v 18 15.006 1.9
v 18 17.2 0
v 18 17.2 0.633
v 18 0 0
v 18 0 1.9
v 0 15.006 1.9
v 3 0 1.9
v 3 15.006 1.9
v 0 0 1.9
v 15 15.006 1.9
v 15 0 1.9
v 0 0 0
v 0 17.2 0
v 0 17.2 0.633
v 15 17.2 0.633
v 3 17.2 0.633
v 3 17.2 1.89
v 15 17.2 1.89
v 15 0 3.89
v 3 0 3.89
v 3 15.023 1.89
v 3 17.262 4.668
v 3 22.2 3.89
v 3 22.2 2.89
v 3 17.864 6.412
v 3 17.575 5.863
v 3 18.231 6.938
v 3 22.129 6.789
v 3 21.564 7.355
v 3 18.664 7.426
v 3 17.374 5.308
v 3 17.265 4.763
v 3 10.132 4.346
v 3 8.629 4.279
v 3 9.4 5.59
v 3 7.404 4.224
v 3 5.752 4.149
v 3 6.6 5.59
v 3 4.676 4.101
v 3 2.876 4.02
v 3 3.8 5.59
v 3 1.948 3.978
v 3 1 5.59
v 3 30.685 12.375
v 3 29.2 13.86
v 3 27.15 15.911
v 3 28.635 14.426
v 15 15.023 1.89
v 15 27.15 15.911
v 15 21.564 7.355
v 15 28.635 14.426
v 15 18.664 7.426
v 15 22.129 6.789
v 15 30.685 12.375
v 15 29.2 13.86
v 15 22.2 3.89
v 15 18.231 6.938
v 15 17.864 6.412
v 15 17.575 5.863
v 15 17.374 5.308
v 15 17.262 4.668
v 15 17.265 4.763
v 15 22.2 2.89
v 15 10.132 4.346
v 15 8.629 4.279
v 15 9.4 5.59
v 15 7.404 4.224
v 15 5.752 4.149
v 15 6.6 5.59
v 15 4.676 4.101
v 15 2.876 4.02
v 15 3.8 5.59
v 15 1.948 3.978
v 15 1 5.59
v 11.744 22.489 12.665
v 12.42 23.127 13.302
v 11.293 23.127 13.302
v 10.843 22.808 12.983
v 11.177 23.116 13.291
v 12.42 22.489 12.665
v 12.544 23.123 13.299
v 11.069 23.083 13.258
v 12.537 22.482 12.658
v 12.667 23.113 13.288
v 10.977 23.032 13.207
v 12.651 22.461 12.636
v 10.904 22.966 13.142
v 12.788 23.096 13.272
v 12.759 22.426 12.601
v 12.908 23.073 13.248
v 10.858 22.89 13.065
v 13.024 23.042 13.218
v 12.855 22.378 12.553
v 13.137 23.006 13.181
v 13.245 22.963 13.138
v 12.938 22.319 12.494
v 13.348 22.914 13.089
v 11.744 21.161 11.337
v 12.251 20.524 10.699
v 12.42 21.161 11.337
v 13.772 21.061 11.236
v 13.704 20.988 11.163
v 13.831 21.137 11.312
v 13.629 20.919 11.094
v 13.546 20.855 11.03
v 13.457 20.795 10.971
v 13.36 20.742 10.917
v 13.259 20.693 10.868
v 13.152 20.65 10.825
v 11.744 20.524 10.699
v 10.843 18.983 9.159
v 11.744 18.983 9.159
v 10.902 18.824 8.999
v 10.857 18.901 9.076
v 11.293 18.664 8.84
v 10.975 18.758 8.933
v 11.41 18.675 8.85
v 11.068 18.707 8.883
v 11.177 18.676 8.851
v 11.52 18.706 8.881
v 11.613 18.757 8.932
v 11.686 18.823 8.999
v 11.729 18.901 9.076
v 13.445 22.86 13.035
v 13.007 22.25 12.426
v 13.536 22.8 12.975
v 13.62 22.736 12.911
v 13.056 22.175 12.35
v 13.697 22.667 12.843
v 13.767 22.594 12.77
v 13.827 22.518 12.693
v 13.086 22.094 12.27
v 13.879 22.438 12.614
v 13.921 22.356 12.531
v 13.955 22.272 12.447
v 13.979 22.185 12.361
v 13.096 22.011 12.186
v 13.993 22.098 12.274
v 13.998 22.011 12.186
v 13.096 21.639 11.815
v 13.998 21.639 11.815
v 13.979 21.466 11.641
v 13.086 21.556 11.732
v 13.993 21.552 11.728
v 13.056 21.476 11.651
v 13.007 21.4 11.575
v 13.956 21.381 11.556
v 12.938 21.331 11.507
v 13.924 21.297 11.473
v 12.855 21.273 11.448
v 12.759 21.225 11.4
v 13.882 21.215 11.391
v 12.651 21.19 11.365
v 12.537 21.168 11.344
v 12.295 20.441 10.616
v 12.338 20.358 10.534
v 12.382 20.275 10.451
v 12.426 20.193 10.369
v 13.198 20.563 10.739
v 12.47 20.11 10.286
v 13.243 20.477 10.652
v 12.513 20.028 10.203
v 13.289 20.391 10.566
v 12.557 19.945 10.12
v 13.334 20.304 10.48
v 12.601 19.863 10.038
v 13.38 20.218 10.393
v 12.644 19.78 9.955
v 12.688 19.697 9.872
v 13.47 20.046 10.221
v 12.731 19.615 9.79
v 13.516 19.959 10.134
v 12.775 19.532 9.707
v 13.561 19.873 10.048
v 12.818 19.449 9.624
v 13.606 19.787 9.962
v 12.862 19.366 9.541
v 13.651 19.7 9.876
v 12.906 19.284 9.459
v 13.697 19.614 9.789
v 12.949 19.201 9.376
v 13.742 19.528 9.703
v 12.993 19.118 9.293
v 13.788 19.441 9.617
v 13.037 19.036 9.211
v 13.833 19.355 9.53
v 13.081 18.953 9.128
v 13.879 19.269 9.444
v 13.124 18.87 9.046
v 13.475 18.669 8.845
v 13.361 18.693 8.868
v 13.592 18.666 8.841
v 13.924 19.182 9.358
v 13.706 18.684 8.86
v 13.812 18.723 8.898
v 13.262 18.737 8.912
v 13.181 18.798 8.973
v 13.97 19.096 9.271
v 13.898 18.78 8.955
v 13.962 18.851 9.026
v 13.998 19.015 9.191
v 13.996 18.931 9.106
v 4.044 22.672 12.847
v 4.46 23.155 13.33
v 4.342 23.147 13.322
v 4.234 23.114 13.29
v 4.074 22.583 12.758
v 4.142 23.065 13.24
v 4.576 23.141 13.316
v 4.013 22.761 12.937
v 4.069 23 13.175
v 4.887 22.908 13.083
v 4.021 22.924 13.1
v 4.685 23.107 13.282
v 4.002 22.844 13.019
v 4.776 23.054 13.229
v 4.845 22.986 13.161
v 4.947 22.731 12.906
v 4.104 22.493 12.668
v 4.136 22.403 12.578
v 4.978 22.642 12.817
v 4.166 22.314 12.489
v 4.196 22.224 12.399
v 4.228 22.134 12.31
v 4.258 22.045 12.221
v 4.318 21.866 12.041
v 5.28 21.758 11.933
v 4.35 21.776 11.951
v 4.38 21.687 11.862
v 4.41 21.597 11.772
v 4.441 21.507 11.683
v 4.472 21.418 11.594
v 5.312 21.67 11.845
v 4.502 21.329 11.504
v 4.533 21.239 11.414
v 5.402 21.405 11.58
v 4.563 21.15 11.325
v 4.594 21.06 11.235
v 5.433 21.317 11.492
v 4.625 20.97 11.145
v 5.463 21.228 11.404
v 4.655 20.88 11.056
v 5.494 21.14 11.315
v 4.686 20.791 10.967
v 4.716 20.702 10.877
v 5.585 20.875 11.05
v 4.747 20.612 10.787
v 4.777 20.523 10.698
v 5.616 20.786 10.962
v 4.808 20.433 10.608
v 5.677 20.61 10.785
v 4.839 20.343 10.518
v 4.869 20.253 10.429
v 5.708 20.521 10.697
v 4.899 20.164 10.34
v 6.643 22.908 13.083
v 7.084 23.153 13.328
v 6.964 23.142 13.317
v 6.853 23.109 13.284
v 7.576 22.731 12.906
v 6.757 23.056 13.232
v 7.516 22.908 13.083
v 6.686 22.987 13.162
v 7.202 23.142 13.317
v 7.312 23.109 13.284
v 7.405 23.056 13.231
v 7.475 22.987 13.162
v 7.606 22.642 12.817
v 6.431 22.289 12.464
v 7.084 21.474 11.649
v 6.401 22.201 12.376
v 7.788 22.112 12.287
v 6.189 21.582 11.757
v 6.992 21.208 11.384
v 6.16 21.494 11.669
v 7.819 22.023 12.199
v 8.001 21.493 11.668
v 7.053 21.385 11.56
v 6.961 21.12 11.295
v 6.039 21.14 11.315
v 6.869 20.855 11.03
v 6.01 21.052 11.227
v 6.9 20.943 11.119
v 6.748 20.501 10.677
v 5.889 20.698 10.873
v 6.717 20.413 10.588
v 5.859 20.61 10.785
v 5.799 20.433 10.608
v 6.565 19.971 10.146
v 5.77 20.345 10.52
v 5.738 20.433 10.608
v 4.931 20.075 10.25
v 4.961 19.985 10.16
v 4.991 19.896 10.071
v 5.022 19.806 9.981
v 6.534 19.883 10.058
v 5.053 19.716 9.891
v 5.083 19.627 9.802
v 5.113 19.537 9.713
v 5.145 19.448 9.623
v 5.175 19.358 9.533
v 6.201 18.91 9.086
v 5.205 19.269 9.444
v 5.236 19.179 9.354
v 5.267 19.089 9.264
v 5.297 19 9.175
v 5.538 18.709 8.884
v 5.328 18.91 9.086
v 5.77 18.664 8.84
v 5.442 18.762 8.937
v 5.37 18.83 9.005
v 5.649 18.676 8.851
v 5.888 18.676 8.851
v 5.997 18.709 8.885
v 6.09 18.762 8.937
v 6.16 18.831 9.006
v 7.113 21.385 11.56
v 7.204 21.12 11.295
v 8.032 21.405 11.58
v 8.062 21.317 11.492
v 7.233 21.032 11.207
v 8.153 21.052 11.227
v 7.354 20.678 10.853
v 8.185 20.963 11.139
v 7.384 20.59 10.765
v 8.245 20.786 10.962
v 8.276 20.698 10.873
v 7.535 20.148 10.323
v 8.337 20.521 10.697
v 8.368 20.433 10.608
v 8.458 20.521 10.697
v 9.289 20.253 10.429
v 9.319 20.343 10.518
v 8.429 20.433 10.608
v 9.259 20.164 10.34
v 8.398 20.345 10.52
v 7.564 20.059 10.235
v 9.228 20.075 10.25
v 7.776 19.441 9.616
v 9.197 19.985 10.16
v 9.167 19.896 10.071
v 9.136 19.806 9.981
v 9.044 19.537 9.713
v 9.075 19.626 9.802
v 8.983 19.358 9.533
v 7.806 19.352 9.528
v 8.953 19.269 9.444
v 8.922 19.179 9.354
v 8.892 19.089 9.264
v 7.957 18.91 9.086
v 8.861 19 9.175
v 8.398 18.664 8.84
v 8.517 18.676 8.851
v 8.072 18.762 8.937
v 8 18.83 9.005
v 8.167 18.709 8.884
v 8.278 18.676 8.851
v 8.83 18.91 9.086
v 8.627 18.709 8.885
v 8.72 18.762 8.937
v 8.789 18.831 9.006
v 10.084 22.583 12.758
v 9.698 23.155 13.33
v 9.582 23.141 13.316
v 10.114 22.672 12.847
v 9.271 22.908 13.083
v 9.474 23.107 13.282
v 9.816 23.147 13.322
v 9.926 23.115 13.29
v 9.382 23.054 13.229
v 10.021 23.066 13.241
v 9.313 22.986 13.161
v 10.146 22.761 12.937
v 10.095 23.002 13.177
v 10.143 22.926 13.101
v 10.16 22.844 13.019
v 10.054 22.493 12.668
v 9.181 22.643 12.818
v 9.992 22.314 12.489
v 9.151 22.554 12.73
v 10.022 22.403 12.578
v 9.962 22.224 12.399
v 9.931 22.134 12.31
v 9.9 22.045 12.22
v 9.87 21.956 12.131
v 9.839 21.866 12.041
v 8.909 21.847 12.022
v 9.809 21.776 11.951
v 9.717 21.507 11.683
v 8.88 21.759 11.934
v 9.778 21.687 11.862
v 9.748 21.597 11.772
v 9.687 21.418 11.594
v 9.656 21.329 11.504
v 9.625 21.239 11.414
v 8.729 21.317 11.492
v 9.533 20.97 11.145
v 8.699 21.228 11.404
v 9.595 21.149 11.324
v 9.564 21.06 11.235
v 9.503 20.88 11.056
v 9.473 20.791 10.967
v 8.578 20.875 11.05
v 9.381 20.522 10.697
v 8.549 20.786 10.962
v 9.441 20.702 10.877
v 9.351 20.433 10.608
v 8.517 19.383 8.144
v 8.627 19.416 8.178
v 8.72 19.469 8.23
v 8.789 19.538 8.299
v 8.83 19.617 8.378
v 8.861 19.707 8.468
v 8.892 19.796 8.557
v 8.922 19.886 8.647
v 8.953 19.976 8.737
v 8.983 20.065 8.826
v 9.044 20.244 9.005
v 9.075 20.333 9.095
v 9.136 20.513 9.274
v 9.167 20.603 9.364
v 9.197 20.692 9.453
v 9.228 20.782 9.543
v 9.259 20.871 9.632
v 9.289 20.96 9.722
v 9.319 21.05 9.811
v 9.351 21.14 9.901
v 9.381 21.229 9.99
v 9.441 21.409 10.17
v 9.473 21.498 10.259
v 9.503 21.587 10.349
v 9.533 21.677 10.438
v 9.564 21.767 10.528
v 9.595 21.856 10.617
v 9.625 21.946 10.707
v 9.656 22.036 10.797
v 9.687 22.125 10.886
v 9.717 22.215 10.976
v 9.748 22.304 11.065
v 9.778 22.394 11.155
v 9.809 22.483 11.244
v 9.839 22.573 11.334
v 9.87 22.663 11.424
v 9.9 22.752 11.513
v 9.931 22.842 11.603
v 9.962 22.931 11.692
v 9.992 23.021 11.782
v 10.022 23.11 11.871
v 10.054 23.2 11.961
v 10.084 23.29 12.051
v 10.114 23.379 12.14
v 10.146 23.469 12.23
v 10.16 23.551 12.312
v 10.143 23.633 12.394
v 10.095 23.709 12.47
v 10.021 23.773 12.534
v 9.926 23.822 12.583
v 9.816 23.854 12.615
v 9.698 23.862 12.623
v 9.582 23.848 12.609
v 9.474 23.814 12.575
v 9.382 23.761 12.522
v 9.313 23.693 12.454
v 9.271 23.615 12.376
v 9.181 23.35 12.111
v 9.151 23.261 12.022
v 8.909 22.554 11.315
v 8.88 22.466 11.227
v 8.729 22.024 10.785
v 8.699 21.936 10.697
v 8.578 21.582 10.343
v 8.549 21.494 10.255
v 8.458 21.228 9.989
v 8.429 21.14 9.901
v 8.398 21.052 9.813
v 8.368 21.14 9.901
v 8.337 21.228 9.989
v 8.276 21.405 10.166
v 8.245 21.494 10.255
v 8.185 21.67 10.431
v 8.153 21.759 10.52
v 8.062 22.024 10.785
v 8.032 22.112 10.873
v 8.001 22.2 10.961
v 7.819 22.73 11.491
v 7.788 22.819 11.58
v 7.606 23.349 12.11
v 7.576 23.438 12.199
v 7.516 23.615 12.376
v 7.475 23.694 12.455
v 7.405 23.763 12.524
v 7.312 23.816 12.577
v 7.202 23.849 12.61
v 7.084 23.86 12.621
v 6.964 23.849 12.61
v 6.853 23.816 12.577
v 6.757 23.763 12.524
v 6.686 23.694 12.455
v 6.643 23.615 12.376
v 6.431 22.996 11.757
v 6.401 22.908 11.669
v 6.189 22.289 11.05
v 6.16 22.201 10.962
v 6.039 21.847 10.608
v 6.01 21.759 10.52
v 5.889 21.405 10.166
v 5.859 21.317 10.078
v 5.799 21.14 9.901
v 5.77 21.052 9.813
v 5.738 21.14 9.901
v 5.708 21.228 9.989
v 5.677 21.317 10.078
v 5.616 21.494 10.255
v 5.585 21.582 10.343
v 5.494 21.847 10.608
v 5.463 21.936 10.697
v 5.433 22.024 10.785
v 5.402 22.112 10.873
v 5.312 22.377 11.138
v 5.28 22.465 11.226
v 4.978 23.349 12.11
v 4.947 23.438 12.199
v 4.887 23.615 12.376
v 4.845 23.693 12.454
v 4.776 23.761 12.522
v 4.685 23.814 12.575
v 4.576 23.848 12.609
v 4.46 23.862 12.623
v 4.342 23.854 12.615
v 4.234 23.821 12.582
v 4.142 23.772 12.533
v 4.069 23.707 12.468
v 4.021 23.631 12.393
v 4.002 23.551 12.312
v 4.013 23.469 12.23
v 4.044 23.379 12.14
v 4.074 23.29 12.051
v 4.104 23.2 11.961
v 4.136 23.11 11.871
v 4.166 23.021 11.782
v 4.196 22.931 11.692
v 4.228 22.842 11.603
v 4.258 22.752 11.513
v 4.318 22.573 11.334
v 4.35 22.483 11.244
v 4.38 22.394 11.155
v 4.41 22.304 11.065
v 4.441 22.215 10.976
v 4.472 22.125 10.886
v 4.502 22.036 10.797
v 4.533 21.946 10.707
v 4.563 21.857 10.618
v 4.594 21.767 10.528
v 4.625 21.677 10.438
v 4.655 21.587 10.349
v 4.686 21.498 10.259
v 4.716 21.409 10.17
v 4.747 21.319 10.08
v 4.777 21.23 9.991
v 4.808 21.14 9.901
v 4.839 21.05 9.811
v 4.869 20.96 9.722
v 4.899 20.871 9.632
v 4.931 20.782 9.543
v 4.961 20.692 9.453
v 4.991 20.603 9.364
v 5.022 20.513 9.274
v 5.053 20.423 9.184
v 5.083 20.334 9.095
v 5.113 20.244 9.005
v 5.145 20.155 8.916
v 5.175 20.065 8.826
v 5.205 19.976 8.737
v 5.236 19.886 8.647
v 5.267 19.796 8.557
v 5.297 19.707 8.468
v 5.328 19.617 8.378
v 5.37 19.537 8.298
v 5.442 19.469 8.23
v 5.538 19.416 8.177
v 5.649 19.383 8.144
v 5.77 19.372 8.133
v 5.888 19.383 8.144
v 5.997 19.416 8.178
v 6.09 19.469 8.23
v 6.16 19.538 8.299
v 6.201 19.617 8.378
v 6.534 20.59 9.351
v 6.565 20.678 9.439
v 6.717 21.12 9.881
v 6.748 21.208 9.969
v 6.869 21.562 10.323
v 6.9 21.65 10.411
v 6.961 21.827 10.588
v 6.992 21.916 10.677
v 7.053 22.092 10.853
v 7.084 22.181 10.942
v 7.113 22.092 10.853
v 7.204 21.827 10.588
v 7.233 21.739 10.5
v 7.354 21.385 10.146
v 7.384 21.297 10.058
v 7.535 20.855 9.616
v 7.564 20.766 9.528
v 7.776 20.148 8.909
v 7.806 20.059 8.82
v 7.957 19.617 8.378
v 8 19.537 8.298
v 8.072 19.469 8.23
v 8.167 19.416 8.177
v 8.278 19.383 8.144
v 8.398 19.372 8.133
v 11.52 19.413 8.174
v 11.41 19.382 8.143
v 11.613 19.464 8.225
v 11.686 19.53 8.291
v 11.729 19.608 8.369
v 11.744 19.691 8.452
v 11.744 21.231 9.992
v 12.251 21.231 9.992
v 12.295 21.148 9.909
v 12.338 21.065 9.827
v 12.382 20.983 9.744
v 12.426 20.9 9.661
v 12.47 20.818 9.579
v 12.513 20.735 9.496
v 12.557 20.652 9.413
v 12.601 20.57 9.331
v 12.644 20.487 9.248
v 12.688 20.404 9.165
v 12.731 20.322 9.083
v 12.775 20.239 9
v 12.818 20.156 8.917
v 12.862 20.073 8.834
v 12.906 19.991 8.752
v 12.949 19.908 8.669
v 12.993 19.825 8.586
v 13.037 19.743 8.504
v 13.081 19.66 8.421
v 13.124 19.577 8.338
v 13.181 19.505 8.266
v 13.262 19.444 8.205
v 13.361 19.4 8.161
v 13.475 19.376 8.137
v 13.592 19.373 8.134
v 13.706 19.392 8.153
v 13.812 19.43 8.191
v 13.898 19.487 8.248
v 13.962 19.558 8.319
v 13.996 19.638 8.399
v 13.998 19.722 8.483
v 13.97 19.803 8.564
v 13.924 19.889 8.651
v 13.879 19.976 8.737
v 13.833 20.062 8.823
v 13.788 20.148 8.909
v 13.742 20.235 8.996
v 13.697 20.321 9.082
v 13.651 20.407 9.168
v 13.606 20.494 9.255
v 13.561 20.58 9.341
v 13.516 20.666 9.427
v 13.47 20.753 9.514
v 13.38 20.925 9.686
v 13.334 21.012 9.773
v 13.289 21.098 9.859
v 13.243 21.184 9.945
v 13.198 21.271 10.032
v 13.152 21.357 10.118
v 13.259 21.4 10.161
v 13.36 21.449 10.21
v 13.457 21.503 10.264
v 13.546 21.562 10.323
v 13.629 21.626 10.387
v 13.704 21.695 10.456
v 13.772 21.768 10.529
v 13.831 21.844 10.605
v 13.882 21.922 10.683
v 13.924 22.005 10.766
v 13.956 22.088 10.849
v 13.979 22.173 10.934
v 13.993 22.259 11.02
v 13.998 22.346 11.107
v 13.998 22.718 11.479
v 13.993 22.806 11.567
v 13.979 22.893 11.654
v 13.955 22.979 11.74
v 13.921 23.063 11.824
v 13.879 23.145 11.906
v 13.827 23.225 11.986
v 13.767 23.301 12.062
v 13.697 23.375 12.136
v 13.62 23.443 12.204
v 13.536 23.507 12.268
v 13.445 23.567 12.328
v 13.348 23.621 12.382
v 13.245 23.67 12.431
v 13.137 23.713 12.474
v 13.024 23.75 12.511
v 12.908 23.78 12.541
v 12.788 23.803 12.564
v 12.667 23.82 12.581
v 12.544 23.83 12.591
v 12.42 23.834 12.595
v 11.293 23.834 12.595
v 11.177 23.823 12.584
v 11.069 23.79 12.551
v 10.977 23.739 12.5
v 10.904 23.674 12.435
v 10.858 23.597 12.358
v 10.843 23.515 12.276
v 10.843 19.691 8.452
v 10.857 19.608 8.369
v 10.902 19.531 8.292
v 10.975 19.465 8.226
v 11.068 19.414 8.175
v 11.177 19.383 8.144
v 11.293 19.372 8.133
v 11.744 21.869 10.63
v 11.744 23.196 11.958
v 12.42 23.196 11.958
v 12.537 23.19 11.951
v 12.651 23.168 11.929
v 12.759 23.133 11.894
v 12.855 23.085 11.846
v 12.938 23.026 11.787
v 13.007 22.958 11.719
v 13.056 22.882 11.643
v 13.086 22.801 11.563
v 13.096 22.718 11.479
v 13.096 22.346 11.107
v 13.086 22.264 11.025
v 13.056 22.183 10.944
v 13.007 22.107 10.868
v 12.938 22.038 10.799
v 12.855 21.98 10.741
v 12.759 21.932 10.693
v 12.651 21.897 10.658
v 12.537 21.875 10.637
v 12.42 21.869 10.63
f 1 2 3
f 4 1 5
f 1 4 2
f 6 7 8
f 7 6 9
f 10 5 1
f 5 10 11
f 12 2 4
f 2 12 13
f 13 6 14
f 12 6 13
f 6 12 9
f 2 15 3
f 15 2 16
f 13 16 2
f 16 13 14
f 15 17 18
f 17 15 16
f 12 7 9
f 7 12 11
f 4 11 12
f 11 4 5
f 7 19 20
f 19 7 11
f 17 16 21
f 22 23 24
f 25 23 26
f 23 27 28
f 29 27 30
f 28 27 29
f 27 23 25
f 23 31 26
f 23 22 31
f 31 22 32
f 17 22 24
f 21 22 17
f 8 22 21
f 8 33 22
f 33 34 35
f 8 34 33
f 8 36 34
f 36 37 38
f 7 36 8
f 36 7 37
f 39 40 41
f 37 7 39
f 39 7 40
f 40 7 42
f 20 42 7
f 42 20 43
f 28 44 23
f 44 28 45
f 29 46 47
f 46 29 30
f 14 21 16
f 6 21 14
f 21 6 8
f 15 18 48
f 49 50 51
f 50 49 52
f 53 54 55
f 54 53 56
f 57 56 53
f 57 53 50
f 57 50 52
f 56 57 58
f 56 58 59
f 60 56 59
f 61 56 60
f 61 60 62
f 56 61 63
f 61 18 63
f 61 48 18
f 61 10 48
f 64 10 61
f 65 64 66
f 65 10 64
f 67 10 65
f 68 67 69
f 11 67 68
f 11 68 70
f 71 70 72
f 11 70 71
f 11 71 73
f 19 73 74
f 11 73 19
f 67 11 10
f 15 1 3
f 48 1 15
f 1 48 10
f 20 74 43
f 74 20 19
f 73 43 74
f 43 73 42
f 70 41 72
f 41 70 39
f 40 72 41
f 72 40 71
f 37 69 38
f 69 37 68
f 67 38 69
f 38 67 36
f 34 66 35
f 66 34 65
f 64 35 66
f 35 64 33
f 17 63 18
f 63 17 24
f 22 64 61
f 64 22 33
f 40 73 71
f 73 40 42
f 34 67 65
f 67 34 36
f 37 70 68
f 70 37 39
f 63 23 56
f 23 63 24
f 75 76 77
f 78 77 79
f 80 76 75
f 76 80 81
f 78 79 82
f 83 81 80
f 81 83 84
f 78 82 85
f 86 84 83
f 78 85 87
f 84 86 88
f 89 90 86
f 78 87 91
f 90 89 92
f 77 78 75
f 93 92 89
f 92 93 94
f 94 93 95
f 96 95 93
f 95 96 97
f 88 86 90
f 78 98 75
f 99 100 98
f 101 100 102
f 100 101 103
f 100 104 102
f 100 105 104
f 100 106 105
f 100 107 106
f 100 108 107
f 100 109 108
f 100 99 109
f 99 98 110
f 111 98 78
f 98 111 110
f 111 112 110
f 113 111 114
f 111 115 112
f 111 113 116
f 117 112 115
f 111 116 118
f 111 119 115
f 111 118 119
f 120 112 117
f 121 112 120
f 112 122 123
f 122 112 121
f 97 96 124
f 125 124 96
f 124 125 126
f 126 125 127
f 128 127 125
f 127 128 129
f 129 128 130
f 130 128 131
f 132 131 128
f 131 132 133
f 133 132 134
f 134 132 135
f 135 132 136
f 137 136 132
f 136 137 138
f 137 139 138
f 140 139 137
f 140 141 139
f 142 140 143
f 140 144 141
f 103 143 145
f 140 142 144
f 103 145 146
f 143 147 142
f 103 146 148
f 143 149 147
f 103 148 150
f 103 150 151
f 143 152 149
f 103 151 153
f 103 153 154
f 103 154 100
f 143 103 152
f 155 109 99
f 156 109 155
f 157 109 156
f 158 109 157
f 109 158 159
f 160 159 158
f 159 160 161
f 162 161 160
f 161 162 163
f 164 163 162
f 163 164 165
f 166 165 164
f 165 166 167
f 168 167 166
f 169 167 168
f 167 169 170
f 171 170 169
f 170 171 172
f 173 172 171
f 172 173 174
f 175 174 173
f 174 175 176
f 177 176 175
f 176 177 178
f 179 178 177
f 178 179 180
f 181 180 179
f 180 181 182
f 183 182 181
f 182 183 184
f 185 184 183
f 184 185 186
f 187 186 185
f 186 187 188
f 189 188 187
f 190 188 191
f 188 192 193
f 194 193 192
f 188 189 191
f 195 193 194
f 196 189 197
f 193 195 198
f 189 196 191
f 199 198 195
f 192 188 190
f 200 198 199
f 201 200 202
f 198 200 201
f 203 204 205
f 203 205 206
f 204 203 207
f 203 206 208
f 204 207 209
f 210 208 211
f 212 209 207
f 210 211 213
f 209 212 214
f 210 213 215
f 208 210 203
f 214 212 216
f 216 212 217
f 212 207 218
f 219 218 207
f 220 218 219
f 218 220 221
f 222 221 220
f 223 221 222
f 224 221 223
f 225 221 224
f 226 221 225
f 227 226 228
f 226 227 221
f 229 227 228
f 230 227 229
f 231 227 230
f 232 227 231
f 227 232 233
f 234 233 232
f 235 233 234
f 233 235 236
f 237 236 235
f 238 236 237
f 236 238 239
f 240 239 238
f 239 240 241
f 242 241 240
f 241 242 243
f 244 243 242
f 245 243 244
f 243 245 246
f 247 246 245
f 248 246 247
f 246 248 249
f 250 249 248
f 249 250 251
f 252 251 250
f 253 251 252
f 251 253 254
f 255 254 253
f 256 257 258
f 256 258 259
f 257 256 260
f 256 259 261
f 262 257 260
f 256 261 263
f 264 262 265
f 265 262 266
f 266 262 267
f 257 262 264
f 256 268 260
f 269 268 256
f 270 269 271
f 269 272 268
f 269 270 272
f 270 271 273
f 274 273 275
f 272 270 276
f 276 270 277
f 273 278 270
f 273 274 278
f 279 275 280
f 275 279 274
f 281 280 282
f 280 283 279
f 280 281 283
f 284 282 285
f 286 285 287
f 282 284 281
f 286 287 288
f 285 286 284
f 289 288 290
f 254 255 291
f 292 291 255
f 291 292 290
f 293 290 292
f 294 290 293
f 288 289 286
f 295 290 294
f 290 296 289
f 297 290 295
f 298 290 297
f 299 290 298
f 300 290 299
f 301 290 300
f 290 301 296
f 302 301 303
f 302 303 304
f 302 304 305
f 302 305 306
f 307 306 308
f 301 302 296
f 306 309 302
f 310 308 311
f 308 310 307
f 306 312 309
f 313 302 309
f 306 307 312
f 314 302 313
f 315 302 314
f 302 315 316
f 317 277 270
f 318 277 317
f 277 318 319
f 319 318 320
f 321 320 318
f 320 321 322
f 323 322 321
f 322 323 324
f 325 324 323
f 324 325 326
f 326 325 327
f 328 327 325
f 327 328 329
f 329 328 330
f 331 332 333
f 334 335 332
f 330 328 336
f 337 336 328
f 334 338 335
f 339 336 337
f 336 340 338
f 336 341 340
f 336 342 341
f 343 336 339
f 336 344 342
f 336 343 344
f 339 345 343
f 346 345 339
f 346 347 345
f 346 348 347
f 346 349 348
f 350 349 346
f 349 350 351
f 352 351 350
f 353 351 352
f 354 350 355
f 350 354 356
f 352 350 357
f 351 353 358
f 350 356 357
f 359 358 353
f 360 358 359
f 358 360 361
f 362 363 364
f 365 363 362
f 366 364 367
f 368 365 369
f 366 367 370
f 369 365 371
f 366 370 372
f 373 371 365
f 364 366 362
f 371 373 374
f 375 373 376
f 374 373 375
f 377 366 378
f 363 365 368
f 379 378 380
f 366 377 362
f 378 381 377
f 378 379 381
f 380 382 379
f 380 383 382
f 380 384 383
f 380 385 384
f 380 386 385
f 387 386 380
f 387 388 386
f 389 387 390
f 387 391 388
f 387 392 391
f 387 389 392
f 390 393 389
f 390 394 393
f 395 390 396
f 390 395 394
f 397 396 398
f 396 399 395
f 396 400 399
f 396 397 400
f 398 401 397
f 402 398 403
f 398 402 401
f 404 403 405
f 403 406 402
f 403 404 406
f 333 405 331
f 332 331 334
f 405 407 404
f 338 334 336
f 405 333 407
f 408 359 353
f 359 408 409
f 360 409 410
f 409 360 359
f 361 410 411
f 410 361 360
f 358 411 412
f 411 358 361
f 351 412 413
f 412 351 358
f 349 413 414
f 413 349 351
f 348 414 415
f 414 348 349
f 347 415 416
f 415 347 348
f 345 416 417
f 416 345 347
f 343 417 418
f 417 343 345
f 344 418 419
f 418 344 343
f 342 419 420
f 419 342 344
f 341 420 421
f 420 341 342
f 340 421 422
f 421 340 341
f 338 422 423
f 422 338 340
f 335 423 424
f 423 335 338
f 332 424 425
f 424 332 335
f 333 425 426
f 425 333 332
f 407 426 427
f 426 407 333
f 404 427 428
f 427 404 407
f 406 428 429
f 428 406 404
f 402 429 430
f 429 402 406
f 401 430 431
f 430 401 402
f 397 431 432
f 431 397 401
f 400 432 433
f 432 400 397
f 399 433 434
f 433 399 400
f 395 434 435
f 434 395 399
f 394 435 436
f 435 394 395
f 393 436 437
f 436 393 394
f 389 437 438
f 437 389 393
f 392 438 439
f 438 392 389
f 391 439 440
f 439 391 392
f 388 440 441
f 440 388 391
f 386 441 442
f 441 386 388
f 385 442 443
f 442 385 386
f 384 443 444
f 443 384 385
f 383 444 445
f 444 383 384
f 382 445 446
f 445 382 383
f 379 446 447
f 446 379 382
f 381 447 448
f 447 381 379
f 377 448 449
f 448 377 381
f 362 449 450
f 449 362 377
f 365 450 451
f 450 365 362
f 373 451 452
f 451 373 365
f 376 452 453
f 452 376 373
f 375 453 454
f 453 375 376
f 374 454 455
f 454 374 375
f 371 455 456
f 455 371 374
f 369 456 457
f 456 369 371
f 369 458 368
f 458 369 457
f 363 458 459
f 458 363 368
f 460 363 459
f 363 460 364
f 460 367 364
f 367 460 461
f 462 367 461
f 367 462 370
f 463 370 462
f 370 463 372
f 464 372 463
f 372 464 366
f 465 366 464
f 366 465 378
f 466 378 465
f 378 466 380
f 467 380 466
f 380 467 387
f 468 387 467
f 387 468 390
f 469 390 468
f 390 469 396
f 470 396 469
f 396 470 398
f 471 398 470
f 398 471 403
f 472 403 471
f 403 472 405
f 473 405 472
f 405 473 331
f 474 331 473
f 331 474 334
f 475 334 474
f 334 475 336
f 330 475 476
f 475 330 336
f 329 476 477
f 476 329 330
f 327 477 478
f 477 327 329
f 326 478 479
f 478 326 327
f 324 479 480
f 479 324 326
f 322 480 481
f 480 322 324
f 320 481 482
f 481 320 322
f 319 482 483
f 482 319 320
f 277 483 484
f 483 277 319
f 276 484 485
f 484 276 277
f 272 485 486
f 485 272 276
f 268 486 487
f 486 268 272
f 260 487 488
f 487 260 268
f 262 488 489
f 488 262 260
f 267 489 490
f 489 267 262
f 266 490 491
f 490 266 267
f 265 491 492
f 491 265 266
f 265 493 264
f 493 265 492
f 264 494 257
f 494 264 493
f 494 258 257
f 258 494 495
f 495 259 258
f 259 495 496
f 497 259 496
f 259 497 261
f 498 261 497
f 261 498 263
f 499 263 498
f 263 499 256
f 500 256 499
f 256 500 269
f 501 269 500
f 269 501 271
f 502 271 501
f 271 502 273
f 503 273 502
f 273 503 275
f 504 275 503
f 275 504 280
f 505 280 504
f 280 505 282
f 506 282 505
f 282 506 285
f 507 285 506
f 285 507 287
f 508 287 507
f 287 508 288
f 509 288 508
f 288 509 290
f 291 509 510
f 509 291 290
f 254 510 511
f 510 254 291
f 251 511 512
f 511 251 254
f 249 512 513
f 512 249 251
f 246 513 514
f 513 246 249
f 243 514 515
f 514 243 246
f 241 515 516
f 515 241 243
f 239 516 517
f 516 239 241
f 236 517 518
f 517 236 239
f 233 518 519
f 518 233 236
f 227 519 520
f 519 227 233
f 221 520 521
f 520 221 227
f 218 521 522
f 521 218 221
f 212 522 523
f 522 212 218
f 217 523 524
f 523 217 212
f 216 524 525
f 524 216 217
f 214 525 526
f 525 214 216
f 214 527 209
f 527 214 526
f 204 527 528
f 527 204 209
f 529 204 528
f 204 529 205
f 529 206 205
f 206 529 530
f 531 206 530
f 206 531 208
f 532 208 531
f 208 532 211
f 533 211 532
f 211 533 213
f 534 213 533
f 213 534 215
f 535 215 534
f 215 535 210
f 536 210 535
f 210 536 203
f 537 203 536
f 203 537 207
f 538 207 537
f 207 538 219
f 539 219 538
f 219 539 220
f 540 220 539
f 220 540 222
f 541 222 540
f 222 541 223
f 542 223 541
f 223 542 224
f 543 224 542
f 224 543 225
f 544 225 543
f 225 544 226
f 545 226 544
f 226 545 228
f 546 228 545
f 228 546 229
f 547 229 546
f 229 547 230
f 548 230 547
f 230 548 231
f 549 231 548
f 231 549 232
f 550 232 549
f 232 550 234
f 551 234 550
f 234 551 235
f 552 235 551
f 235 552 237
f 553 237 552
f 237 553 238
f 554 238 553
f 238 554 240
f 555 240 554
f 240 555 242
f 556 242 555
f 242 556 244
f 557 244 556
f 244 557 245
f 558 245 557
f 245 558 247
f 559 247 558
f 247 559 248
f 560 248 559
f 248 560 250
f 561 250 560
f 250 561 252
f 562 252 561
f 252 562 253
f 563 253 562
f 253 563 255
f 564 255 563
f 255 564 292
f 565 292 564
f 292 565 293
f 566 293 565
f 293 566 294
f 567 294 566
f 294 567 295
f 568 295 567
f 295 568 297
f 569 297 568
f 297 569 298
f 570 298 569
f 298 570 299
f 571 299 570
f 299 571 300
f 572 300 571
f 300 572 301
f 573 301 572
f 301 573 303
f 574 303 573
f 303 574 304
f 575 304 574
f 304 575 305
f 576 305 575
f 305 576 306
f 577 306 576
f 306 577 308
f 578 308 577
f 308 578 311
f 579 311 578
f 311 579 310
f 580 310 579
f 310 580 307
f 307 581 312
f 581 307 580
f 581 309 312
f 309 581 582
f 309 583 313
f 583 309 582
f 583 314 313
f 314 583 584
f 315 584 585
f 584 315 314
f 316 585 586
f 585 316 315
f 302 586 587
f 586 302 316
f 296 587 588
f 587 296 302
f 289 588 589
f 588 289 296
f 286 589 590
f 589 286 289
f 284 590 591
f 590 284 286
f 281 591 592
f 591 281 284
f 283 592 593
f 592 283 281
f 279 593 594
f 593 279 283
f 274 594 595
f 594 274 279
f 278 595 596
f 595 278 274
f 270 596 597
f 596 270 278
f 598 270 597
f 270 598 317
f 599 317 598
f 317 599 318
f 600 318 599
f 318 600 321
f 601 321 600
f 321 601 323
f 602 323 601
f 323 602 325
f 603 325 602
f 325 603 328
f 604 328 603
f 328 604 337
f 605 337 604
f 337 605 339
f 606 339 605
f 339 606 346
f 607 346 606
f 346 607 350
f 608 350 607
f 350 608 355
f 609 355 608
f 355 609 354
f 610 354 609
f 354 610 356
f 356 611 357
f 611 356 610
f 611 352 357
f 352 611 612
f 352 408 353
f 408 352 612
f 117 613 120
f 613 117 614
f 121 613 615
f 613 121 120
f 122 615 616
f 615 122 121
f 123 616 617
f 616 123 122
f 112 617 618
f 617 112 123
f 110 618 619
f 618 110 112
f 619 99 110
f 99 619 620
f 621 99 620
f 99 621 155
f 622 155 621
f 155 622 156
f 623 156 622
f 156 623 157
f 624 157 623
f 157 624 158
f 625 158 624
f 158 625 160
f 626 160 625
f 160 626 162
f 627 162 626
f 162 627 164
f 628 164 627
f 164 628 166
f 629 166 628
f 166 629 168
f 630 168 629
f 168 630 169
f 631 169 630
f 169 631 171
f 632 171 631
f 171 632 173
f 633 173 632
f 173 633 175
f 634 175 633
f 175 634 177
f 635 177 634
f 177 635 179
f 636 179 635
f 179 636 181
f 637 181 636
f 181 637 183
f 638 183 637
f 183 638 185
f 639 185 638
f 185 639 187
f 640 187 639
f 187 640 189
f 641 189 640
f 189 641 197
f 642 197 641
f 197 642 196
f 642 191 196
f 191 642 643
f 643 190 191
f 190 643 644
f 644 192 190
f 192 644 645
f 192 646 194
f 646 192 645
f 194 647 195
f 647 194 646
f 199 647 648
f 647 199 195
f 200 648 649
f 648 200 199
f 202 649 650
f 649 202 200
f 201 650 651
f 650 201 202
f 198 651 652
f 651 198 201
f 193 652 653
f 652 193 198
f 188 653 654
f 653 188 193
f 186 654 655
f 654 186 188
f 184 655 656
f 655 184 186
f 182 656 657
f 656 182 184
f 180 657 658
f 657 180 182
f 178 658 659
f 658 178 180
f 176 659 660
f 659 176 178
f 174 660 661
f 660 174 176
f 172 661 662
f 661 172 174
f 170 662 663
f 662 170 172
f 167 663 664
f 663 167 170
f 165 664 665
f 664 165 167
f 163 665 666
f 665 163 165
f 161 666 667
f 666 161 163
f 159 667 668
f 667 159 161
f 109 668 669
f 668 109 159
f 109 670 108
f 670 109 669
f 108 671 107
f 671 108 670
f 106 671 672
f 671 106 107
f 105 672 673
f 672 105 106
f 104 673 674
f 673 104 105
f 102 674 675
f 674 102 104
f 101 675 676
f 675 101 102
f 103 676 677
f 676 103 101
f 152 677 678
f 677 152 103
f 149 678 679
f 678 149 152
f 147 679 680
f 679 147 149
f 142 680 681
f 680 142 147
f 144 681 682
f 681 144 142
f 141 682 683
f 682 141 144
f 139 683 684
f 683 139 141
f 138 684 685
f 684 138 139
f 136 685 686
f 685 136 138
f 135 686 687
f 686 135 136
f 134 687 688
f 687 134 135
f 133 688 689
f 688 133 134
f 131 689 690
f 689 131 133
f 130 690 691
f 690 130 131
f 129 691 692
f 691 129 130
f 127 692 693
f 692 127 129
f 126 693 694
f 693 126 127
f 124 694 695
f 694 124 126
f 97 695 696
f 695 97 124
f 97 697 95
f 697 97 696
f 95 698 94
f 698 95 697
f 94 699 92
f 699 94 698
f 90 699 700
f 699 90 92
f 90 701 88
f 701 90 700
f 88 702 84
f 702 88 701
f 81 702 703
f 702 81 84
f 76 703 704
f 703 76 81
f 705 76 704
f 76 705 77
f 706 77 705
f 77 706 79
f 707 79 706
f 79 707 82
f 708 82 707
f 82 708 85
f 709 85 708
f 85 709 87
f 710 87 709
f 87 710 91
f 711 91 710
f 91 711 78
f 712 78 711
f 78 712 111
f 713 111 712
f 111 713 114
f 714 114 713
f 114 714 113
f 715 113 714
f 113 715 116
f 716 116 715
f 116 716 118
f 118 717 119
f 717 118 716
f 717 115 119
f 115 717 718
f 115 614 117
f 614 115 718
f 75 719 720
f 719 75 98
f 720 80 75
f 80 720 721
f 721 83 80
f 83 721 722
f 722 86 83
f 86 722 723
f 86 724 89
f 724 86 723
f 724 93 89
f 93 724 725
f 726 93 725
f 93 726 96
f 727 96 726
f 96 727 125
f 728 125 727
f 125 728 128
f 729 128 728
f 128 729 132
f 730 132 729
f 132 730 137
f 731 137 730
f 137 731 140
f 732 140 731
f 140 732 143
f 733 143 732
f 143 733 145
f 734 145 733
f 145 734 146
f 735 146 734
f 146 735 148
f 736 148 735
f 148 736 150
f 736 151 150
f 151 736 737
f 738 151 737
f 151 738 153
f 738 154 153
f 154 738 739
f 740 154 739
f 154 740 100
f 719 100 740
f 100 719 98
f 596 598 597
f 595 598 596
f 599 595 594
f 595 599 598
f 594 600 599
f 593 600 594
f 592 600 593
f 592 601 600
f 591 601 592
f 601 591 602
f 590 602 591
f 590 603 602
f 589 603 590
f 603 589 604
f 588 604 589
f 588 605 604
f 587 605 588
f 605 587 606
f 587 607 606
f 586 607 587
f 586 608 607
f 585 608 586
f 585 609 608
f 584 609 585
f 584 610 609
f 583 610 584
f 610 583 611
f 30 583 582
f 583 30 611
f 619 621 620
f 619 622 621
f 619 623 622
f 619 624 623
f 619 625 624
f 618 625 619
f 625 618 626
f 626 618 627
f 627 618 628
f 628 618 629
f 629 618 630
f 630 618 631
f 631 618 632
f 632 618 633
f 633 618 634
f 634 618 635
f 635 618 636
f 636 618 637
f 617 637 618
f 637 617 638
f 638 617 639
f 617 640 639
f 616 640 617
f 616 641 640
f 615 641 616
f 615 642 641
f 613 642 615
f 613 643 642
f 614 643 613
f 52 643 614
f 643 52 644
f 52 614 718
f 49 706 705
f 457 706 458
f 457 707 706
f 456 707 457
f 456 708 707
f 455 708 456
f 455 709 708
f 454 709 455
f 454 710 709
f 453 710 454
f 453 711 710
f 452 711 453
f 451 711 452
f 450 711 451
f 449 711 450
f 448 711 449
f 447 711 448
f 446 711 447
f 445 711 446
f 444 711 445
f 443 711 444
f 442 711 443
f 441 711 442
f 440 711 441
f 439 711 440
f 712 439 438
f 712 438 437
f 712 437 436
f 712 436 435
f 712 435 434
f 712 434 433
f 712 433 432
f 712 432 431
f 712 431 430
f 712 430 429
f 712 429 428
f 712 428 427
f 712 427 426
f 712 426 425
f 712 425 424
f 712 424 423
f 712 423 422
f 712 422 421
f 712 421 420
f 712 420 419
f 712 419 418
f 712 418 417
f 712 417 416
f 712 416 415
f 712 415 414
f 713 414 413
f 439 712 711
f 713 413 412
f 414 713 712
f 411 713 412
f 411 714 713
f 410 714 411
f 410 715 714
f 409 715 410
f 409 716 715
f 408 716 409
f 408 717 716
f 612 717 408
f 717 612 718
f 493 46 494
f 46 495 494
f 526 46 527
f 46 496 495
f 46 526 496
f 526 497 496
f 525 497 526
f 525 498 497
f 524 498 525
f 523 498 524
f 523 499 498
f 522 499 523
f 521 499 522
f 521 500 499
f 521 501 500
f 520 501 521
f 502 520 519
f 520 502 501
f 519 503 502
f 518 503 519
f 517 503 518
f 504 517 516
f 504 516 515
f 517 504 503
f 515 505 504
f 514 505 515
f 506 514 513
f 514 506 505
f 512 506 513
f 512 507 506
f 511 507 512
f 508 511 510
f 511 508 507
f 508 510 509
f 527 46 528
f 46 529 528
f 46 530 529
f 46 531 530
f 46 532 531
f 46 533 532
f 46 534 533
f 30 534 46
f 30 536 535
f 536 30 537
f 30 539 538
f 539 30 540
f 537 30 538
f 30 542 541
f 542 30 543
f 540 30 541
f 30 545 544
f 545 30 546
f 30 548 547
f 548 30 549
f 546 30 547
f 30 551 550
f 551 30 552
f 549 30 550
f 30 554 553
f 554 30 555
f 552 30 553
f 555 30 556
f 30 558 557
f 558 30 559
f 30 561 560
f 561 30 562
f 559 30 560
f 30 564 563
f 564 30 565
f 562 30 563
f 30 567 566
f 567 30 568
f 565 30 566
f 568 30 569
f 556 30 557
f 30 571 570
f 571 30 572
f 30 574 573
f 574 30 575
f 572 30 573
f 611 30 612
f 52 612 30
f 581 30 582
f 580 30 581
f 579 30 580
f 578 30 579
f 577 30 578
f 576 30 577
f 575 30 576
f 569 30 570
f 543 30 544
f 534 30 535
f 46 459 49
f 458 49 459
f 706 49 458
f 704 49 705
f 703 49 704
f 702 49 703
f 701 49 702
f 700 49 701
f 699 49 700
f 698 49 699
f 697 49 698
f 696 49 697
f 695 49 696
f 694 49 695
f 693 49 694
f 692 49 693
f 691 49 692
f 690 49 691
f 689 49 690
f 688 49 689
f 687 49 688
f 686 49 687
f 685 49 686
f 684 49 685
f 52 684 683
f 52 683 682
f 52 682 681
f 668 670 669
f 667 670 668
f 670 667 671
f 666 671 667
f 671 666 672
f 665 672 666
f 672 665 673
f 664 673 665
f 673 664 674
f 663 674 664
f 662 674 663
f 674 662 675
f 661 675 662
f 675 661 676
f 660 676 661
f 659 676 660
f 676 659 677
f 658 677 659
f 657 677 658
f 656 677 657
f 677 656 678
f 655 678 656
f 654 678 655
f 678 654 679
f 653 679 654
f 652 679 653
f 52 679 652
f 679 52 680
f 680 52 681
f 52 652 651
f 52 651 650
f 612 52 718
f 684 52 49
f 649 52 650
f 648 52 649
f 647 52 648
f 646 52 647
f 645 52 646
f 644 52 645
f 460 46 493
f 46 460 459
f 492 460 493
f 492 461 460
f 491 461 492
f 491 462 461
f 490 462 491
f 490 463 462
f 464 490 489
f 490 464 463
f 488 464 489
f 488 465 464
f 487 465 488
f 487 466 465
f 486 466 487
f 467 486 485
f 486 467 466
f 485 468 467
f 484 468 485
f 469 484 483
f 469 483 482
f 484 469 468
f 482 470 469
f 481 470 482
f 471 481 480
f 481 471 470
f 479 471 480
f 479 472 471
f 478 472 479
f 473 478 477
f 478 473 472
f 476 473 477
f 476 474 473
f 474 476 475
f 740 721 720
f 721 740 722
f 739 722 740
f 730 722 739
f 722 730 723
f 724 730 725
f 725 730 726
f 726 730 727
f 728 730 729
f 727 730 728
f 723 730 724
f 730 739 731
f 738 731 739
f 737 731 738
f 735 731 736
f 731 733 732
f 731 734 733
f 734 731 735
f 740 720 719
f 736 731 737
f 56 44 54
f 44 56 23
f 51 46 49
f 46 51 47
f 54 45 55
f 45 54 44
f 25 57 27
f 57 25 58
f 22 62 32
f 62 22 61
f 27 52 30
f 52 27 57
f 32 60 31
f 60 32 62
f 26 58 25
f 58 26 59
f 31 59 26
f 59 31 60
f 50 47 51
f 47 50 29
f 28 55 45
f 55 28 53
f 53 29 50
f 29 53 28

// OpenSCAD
// file: hotshoe_paper_clip.scad
hs_w      = 18.0;
hs_l      = 17.2;
hs_h      = 1.9; // 2
hs2_w     = 12;
//hs2_l     = hs_l+5;
hs2_h     = 2;
hs2_x_off = (hs_w-hs2_w)/2;
hs2_elev  = 1;
hs3_l     = 12;
hs3_h     = 5;
hs3_w     = 0.8;

module hotshoe(
    logofile="", logooffset=1,
    len=5
    ) {
    hs2_l = hs_l+len;
    union() {
        // lower hotshoe
        difference() {
            cube([hs_w, hs_l, hs_h]);
            translate([-1,hs_l,hs_h/3]) rotate([60,0,0]) cube([hs2_x_off+1, 10,10]);
            translate([hs2_x_off+hs2_w,hs_l,hs_h/3]) rotate([60,0,0]) cube([hs2_x_off+1, 10,10]);
        }
        // upper plate including grip
        translate([hs2_x_off, 0, hs_h-0.01]) {
            rotate([90,0,90])
            linear_extrude(height=hs2_w) {
                polygon(
                points=[[0,0], [hs2_l,0], [hs_l,0], [hs2_l,hs2_elev],[hs2_l,hs2_elev+hs2_h],
                //[hs_l,hs2_h],
                [0,hs2_h]],
                paths=[[0,1,2,3,4,5,6]]
                );
            }
            for ( i = [0:3]) {
                translate([hs2_w/2,1+2.8*(i),hs2_h]) scale([1,1,1.7]) rotate([45,0,0]) cube([hs2_w,sqrt(2), sqrt(2)], center=true);
            }
        }
        translate([hs2_x_off, hs2_l, hs_h+hs2_elev+hs2_h/2-0.01])
        rotate([45,0,0])
        difference() {
            union() {
                // Logo
                translate([logooffset,1,hs3_h-1]) linear_extrude(height=1+1) import(file=logofile);
                // clasp
                cube([hs2_w, hs3_l, hs3_h]);
                translate([0,0,hs3_h/2]) scale([1,1.5,1]) rotate([0,90,0]) cylinder(h=hs2_w, r=hs3_h/2, $fn=36);
            }
            translate([-1,2,(hs3_h-hs3_w)/2]) cube([hs2_w+2, hs3_l, hs3_w]);
        }
    }
}
// main file
include <hotshoe_paper_clip.scad>

hotshoe(logofile="WR.dxf", logooffset=1);
